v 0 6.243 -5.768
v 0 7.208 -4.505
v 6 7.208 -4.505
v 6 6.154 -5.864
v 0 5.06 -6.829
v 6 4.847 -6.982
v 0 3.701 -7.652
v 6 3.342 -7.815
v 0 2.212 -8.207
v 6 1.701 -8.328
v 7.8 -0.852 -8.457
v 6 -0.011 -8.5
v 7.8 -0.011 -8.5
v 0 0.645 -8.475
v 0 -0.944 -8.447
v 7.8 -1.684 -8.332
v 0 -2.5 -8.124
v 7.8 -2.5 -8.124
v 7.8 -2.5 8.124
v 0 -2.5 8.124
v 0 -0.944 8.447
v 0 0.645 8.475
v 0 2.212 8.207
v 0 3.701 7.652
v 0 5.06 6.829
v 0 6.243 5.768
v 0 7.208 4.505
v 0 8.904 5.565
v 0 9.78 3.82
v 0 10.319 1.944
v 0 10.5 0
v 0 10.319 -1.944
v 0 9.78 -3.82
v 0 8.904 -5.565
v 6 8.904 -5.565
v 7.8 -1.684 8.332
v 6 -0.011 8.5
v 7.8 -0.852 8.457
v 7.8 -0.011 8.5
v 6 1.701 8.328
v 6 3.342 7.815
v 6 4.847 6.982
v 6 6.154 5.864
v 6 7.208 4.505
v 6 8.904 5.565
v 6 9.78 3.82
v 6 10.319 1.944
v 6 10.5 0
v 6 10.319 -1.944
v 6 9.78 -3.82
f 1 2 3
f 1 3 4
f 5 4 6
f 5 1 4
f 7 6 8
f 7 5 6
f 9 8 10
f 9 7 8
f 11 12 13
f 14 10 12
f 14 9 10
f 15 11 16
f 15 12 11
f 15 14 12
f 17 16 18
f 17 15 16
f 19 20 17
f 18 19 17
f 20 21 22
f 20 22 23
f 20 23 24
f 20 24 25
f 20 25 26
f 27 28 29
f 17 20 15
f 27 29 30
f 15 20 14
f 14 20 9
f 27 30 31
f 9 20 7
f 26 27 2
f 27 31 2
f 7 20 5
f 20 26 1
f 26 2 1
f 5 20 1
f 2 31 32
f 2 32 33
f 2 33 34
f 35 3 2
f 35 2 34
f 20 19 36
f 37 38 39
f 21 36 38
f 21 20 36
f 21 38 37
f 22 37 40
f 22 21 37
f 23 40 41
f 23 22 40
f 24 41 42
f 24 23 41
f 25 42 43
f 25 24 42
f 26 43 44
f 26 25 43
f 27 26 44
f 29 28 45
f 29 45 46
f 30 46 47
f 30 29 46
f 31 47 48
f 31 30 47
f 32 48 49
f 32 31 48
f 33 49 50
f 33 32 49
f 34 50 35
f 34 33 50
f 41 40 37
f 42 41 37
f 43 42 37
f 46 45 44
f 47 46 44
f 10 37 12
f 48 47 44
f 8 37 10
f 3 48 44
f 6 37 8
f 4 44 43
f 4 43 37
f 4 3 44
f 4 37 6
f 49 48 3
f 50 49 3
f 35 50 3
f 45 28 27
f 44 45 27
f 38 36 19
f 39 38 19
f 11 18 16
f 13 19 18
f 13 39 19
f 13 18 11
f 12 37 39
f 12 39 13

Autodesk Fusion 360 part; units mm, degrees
sketch "Sketch1" plane through (0, 0, 0) normal (1, 0, 0) x (0, 0, -1)
  circle A0 centre (0, 0) radius 8.5
  line L0 (-9.9073, -2.5) -> (12, -2.5)
  circle A1 centre (0, 0) radius 10.5
  line L1 (-7.5, 12) -> (7.5, 12)
  line L2 (-7.5, 12) -> (0, 0)
  line L3 (0, 0) -> (7.5, 12)
  line L4 (-10.5, -0.0107) -> (10.5, -0.0107)
  point P0 (0, 12)
  dimension "d1" = 17
  dimension "d2" = 2.5
  dimension "d5" = 21
  dimension "d6" = 12
  dimension "d7" = 15
extrude "Extrude1" add sketch "Sketch1" along normal blind 6 contours A0 L2 L3 L4 | A0 L2 L3 | A0 A1 L2 L3 | A0 L0 L4
extrude "Extrude2" add sketch "Sketch1" along normal blind 7.8 contours A0 L0 L4
